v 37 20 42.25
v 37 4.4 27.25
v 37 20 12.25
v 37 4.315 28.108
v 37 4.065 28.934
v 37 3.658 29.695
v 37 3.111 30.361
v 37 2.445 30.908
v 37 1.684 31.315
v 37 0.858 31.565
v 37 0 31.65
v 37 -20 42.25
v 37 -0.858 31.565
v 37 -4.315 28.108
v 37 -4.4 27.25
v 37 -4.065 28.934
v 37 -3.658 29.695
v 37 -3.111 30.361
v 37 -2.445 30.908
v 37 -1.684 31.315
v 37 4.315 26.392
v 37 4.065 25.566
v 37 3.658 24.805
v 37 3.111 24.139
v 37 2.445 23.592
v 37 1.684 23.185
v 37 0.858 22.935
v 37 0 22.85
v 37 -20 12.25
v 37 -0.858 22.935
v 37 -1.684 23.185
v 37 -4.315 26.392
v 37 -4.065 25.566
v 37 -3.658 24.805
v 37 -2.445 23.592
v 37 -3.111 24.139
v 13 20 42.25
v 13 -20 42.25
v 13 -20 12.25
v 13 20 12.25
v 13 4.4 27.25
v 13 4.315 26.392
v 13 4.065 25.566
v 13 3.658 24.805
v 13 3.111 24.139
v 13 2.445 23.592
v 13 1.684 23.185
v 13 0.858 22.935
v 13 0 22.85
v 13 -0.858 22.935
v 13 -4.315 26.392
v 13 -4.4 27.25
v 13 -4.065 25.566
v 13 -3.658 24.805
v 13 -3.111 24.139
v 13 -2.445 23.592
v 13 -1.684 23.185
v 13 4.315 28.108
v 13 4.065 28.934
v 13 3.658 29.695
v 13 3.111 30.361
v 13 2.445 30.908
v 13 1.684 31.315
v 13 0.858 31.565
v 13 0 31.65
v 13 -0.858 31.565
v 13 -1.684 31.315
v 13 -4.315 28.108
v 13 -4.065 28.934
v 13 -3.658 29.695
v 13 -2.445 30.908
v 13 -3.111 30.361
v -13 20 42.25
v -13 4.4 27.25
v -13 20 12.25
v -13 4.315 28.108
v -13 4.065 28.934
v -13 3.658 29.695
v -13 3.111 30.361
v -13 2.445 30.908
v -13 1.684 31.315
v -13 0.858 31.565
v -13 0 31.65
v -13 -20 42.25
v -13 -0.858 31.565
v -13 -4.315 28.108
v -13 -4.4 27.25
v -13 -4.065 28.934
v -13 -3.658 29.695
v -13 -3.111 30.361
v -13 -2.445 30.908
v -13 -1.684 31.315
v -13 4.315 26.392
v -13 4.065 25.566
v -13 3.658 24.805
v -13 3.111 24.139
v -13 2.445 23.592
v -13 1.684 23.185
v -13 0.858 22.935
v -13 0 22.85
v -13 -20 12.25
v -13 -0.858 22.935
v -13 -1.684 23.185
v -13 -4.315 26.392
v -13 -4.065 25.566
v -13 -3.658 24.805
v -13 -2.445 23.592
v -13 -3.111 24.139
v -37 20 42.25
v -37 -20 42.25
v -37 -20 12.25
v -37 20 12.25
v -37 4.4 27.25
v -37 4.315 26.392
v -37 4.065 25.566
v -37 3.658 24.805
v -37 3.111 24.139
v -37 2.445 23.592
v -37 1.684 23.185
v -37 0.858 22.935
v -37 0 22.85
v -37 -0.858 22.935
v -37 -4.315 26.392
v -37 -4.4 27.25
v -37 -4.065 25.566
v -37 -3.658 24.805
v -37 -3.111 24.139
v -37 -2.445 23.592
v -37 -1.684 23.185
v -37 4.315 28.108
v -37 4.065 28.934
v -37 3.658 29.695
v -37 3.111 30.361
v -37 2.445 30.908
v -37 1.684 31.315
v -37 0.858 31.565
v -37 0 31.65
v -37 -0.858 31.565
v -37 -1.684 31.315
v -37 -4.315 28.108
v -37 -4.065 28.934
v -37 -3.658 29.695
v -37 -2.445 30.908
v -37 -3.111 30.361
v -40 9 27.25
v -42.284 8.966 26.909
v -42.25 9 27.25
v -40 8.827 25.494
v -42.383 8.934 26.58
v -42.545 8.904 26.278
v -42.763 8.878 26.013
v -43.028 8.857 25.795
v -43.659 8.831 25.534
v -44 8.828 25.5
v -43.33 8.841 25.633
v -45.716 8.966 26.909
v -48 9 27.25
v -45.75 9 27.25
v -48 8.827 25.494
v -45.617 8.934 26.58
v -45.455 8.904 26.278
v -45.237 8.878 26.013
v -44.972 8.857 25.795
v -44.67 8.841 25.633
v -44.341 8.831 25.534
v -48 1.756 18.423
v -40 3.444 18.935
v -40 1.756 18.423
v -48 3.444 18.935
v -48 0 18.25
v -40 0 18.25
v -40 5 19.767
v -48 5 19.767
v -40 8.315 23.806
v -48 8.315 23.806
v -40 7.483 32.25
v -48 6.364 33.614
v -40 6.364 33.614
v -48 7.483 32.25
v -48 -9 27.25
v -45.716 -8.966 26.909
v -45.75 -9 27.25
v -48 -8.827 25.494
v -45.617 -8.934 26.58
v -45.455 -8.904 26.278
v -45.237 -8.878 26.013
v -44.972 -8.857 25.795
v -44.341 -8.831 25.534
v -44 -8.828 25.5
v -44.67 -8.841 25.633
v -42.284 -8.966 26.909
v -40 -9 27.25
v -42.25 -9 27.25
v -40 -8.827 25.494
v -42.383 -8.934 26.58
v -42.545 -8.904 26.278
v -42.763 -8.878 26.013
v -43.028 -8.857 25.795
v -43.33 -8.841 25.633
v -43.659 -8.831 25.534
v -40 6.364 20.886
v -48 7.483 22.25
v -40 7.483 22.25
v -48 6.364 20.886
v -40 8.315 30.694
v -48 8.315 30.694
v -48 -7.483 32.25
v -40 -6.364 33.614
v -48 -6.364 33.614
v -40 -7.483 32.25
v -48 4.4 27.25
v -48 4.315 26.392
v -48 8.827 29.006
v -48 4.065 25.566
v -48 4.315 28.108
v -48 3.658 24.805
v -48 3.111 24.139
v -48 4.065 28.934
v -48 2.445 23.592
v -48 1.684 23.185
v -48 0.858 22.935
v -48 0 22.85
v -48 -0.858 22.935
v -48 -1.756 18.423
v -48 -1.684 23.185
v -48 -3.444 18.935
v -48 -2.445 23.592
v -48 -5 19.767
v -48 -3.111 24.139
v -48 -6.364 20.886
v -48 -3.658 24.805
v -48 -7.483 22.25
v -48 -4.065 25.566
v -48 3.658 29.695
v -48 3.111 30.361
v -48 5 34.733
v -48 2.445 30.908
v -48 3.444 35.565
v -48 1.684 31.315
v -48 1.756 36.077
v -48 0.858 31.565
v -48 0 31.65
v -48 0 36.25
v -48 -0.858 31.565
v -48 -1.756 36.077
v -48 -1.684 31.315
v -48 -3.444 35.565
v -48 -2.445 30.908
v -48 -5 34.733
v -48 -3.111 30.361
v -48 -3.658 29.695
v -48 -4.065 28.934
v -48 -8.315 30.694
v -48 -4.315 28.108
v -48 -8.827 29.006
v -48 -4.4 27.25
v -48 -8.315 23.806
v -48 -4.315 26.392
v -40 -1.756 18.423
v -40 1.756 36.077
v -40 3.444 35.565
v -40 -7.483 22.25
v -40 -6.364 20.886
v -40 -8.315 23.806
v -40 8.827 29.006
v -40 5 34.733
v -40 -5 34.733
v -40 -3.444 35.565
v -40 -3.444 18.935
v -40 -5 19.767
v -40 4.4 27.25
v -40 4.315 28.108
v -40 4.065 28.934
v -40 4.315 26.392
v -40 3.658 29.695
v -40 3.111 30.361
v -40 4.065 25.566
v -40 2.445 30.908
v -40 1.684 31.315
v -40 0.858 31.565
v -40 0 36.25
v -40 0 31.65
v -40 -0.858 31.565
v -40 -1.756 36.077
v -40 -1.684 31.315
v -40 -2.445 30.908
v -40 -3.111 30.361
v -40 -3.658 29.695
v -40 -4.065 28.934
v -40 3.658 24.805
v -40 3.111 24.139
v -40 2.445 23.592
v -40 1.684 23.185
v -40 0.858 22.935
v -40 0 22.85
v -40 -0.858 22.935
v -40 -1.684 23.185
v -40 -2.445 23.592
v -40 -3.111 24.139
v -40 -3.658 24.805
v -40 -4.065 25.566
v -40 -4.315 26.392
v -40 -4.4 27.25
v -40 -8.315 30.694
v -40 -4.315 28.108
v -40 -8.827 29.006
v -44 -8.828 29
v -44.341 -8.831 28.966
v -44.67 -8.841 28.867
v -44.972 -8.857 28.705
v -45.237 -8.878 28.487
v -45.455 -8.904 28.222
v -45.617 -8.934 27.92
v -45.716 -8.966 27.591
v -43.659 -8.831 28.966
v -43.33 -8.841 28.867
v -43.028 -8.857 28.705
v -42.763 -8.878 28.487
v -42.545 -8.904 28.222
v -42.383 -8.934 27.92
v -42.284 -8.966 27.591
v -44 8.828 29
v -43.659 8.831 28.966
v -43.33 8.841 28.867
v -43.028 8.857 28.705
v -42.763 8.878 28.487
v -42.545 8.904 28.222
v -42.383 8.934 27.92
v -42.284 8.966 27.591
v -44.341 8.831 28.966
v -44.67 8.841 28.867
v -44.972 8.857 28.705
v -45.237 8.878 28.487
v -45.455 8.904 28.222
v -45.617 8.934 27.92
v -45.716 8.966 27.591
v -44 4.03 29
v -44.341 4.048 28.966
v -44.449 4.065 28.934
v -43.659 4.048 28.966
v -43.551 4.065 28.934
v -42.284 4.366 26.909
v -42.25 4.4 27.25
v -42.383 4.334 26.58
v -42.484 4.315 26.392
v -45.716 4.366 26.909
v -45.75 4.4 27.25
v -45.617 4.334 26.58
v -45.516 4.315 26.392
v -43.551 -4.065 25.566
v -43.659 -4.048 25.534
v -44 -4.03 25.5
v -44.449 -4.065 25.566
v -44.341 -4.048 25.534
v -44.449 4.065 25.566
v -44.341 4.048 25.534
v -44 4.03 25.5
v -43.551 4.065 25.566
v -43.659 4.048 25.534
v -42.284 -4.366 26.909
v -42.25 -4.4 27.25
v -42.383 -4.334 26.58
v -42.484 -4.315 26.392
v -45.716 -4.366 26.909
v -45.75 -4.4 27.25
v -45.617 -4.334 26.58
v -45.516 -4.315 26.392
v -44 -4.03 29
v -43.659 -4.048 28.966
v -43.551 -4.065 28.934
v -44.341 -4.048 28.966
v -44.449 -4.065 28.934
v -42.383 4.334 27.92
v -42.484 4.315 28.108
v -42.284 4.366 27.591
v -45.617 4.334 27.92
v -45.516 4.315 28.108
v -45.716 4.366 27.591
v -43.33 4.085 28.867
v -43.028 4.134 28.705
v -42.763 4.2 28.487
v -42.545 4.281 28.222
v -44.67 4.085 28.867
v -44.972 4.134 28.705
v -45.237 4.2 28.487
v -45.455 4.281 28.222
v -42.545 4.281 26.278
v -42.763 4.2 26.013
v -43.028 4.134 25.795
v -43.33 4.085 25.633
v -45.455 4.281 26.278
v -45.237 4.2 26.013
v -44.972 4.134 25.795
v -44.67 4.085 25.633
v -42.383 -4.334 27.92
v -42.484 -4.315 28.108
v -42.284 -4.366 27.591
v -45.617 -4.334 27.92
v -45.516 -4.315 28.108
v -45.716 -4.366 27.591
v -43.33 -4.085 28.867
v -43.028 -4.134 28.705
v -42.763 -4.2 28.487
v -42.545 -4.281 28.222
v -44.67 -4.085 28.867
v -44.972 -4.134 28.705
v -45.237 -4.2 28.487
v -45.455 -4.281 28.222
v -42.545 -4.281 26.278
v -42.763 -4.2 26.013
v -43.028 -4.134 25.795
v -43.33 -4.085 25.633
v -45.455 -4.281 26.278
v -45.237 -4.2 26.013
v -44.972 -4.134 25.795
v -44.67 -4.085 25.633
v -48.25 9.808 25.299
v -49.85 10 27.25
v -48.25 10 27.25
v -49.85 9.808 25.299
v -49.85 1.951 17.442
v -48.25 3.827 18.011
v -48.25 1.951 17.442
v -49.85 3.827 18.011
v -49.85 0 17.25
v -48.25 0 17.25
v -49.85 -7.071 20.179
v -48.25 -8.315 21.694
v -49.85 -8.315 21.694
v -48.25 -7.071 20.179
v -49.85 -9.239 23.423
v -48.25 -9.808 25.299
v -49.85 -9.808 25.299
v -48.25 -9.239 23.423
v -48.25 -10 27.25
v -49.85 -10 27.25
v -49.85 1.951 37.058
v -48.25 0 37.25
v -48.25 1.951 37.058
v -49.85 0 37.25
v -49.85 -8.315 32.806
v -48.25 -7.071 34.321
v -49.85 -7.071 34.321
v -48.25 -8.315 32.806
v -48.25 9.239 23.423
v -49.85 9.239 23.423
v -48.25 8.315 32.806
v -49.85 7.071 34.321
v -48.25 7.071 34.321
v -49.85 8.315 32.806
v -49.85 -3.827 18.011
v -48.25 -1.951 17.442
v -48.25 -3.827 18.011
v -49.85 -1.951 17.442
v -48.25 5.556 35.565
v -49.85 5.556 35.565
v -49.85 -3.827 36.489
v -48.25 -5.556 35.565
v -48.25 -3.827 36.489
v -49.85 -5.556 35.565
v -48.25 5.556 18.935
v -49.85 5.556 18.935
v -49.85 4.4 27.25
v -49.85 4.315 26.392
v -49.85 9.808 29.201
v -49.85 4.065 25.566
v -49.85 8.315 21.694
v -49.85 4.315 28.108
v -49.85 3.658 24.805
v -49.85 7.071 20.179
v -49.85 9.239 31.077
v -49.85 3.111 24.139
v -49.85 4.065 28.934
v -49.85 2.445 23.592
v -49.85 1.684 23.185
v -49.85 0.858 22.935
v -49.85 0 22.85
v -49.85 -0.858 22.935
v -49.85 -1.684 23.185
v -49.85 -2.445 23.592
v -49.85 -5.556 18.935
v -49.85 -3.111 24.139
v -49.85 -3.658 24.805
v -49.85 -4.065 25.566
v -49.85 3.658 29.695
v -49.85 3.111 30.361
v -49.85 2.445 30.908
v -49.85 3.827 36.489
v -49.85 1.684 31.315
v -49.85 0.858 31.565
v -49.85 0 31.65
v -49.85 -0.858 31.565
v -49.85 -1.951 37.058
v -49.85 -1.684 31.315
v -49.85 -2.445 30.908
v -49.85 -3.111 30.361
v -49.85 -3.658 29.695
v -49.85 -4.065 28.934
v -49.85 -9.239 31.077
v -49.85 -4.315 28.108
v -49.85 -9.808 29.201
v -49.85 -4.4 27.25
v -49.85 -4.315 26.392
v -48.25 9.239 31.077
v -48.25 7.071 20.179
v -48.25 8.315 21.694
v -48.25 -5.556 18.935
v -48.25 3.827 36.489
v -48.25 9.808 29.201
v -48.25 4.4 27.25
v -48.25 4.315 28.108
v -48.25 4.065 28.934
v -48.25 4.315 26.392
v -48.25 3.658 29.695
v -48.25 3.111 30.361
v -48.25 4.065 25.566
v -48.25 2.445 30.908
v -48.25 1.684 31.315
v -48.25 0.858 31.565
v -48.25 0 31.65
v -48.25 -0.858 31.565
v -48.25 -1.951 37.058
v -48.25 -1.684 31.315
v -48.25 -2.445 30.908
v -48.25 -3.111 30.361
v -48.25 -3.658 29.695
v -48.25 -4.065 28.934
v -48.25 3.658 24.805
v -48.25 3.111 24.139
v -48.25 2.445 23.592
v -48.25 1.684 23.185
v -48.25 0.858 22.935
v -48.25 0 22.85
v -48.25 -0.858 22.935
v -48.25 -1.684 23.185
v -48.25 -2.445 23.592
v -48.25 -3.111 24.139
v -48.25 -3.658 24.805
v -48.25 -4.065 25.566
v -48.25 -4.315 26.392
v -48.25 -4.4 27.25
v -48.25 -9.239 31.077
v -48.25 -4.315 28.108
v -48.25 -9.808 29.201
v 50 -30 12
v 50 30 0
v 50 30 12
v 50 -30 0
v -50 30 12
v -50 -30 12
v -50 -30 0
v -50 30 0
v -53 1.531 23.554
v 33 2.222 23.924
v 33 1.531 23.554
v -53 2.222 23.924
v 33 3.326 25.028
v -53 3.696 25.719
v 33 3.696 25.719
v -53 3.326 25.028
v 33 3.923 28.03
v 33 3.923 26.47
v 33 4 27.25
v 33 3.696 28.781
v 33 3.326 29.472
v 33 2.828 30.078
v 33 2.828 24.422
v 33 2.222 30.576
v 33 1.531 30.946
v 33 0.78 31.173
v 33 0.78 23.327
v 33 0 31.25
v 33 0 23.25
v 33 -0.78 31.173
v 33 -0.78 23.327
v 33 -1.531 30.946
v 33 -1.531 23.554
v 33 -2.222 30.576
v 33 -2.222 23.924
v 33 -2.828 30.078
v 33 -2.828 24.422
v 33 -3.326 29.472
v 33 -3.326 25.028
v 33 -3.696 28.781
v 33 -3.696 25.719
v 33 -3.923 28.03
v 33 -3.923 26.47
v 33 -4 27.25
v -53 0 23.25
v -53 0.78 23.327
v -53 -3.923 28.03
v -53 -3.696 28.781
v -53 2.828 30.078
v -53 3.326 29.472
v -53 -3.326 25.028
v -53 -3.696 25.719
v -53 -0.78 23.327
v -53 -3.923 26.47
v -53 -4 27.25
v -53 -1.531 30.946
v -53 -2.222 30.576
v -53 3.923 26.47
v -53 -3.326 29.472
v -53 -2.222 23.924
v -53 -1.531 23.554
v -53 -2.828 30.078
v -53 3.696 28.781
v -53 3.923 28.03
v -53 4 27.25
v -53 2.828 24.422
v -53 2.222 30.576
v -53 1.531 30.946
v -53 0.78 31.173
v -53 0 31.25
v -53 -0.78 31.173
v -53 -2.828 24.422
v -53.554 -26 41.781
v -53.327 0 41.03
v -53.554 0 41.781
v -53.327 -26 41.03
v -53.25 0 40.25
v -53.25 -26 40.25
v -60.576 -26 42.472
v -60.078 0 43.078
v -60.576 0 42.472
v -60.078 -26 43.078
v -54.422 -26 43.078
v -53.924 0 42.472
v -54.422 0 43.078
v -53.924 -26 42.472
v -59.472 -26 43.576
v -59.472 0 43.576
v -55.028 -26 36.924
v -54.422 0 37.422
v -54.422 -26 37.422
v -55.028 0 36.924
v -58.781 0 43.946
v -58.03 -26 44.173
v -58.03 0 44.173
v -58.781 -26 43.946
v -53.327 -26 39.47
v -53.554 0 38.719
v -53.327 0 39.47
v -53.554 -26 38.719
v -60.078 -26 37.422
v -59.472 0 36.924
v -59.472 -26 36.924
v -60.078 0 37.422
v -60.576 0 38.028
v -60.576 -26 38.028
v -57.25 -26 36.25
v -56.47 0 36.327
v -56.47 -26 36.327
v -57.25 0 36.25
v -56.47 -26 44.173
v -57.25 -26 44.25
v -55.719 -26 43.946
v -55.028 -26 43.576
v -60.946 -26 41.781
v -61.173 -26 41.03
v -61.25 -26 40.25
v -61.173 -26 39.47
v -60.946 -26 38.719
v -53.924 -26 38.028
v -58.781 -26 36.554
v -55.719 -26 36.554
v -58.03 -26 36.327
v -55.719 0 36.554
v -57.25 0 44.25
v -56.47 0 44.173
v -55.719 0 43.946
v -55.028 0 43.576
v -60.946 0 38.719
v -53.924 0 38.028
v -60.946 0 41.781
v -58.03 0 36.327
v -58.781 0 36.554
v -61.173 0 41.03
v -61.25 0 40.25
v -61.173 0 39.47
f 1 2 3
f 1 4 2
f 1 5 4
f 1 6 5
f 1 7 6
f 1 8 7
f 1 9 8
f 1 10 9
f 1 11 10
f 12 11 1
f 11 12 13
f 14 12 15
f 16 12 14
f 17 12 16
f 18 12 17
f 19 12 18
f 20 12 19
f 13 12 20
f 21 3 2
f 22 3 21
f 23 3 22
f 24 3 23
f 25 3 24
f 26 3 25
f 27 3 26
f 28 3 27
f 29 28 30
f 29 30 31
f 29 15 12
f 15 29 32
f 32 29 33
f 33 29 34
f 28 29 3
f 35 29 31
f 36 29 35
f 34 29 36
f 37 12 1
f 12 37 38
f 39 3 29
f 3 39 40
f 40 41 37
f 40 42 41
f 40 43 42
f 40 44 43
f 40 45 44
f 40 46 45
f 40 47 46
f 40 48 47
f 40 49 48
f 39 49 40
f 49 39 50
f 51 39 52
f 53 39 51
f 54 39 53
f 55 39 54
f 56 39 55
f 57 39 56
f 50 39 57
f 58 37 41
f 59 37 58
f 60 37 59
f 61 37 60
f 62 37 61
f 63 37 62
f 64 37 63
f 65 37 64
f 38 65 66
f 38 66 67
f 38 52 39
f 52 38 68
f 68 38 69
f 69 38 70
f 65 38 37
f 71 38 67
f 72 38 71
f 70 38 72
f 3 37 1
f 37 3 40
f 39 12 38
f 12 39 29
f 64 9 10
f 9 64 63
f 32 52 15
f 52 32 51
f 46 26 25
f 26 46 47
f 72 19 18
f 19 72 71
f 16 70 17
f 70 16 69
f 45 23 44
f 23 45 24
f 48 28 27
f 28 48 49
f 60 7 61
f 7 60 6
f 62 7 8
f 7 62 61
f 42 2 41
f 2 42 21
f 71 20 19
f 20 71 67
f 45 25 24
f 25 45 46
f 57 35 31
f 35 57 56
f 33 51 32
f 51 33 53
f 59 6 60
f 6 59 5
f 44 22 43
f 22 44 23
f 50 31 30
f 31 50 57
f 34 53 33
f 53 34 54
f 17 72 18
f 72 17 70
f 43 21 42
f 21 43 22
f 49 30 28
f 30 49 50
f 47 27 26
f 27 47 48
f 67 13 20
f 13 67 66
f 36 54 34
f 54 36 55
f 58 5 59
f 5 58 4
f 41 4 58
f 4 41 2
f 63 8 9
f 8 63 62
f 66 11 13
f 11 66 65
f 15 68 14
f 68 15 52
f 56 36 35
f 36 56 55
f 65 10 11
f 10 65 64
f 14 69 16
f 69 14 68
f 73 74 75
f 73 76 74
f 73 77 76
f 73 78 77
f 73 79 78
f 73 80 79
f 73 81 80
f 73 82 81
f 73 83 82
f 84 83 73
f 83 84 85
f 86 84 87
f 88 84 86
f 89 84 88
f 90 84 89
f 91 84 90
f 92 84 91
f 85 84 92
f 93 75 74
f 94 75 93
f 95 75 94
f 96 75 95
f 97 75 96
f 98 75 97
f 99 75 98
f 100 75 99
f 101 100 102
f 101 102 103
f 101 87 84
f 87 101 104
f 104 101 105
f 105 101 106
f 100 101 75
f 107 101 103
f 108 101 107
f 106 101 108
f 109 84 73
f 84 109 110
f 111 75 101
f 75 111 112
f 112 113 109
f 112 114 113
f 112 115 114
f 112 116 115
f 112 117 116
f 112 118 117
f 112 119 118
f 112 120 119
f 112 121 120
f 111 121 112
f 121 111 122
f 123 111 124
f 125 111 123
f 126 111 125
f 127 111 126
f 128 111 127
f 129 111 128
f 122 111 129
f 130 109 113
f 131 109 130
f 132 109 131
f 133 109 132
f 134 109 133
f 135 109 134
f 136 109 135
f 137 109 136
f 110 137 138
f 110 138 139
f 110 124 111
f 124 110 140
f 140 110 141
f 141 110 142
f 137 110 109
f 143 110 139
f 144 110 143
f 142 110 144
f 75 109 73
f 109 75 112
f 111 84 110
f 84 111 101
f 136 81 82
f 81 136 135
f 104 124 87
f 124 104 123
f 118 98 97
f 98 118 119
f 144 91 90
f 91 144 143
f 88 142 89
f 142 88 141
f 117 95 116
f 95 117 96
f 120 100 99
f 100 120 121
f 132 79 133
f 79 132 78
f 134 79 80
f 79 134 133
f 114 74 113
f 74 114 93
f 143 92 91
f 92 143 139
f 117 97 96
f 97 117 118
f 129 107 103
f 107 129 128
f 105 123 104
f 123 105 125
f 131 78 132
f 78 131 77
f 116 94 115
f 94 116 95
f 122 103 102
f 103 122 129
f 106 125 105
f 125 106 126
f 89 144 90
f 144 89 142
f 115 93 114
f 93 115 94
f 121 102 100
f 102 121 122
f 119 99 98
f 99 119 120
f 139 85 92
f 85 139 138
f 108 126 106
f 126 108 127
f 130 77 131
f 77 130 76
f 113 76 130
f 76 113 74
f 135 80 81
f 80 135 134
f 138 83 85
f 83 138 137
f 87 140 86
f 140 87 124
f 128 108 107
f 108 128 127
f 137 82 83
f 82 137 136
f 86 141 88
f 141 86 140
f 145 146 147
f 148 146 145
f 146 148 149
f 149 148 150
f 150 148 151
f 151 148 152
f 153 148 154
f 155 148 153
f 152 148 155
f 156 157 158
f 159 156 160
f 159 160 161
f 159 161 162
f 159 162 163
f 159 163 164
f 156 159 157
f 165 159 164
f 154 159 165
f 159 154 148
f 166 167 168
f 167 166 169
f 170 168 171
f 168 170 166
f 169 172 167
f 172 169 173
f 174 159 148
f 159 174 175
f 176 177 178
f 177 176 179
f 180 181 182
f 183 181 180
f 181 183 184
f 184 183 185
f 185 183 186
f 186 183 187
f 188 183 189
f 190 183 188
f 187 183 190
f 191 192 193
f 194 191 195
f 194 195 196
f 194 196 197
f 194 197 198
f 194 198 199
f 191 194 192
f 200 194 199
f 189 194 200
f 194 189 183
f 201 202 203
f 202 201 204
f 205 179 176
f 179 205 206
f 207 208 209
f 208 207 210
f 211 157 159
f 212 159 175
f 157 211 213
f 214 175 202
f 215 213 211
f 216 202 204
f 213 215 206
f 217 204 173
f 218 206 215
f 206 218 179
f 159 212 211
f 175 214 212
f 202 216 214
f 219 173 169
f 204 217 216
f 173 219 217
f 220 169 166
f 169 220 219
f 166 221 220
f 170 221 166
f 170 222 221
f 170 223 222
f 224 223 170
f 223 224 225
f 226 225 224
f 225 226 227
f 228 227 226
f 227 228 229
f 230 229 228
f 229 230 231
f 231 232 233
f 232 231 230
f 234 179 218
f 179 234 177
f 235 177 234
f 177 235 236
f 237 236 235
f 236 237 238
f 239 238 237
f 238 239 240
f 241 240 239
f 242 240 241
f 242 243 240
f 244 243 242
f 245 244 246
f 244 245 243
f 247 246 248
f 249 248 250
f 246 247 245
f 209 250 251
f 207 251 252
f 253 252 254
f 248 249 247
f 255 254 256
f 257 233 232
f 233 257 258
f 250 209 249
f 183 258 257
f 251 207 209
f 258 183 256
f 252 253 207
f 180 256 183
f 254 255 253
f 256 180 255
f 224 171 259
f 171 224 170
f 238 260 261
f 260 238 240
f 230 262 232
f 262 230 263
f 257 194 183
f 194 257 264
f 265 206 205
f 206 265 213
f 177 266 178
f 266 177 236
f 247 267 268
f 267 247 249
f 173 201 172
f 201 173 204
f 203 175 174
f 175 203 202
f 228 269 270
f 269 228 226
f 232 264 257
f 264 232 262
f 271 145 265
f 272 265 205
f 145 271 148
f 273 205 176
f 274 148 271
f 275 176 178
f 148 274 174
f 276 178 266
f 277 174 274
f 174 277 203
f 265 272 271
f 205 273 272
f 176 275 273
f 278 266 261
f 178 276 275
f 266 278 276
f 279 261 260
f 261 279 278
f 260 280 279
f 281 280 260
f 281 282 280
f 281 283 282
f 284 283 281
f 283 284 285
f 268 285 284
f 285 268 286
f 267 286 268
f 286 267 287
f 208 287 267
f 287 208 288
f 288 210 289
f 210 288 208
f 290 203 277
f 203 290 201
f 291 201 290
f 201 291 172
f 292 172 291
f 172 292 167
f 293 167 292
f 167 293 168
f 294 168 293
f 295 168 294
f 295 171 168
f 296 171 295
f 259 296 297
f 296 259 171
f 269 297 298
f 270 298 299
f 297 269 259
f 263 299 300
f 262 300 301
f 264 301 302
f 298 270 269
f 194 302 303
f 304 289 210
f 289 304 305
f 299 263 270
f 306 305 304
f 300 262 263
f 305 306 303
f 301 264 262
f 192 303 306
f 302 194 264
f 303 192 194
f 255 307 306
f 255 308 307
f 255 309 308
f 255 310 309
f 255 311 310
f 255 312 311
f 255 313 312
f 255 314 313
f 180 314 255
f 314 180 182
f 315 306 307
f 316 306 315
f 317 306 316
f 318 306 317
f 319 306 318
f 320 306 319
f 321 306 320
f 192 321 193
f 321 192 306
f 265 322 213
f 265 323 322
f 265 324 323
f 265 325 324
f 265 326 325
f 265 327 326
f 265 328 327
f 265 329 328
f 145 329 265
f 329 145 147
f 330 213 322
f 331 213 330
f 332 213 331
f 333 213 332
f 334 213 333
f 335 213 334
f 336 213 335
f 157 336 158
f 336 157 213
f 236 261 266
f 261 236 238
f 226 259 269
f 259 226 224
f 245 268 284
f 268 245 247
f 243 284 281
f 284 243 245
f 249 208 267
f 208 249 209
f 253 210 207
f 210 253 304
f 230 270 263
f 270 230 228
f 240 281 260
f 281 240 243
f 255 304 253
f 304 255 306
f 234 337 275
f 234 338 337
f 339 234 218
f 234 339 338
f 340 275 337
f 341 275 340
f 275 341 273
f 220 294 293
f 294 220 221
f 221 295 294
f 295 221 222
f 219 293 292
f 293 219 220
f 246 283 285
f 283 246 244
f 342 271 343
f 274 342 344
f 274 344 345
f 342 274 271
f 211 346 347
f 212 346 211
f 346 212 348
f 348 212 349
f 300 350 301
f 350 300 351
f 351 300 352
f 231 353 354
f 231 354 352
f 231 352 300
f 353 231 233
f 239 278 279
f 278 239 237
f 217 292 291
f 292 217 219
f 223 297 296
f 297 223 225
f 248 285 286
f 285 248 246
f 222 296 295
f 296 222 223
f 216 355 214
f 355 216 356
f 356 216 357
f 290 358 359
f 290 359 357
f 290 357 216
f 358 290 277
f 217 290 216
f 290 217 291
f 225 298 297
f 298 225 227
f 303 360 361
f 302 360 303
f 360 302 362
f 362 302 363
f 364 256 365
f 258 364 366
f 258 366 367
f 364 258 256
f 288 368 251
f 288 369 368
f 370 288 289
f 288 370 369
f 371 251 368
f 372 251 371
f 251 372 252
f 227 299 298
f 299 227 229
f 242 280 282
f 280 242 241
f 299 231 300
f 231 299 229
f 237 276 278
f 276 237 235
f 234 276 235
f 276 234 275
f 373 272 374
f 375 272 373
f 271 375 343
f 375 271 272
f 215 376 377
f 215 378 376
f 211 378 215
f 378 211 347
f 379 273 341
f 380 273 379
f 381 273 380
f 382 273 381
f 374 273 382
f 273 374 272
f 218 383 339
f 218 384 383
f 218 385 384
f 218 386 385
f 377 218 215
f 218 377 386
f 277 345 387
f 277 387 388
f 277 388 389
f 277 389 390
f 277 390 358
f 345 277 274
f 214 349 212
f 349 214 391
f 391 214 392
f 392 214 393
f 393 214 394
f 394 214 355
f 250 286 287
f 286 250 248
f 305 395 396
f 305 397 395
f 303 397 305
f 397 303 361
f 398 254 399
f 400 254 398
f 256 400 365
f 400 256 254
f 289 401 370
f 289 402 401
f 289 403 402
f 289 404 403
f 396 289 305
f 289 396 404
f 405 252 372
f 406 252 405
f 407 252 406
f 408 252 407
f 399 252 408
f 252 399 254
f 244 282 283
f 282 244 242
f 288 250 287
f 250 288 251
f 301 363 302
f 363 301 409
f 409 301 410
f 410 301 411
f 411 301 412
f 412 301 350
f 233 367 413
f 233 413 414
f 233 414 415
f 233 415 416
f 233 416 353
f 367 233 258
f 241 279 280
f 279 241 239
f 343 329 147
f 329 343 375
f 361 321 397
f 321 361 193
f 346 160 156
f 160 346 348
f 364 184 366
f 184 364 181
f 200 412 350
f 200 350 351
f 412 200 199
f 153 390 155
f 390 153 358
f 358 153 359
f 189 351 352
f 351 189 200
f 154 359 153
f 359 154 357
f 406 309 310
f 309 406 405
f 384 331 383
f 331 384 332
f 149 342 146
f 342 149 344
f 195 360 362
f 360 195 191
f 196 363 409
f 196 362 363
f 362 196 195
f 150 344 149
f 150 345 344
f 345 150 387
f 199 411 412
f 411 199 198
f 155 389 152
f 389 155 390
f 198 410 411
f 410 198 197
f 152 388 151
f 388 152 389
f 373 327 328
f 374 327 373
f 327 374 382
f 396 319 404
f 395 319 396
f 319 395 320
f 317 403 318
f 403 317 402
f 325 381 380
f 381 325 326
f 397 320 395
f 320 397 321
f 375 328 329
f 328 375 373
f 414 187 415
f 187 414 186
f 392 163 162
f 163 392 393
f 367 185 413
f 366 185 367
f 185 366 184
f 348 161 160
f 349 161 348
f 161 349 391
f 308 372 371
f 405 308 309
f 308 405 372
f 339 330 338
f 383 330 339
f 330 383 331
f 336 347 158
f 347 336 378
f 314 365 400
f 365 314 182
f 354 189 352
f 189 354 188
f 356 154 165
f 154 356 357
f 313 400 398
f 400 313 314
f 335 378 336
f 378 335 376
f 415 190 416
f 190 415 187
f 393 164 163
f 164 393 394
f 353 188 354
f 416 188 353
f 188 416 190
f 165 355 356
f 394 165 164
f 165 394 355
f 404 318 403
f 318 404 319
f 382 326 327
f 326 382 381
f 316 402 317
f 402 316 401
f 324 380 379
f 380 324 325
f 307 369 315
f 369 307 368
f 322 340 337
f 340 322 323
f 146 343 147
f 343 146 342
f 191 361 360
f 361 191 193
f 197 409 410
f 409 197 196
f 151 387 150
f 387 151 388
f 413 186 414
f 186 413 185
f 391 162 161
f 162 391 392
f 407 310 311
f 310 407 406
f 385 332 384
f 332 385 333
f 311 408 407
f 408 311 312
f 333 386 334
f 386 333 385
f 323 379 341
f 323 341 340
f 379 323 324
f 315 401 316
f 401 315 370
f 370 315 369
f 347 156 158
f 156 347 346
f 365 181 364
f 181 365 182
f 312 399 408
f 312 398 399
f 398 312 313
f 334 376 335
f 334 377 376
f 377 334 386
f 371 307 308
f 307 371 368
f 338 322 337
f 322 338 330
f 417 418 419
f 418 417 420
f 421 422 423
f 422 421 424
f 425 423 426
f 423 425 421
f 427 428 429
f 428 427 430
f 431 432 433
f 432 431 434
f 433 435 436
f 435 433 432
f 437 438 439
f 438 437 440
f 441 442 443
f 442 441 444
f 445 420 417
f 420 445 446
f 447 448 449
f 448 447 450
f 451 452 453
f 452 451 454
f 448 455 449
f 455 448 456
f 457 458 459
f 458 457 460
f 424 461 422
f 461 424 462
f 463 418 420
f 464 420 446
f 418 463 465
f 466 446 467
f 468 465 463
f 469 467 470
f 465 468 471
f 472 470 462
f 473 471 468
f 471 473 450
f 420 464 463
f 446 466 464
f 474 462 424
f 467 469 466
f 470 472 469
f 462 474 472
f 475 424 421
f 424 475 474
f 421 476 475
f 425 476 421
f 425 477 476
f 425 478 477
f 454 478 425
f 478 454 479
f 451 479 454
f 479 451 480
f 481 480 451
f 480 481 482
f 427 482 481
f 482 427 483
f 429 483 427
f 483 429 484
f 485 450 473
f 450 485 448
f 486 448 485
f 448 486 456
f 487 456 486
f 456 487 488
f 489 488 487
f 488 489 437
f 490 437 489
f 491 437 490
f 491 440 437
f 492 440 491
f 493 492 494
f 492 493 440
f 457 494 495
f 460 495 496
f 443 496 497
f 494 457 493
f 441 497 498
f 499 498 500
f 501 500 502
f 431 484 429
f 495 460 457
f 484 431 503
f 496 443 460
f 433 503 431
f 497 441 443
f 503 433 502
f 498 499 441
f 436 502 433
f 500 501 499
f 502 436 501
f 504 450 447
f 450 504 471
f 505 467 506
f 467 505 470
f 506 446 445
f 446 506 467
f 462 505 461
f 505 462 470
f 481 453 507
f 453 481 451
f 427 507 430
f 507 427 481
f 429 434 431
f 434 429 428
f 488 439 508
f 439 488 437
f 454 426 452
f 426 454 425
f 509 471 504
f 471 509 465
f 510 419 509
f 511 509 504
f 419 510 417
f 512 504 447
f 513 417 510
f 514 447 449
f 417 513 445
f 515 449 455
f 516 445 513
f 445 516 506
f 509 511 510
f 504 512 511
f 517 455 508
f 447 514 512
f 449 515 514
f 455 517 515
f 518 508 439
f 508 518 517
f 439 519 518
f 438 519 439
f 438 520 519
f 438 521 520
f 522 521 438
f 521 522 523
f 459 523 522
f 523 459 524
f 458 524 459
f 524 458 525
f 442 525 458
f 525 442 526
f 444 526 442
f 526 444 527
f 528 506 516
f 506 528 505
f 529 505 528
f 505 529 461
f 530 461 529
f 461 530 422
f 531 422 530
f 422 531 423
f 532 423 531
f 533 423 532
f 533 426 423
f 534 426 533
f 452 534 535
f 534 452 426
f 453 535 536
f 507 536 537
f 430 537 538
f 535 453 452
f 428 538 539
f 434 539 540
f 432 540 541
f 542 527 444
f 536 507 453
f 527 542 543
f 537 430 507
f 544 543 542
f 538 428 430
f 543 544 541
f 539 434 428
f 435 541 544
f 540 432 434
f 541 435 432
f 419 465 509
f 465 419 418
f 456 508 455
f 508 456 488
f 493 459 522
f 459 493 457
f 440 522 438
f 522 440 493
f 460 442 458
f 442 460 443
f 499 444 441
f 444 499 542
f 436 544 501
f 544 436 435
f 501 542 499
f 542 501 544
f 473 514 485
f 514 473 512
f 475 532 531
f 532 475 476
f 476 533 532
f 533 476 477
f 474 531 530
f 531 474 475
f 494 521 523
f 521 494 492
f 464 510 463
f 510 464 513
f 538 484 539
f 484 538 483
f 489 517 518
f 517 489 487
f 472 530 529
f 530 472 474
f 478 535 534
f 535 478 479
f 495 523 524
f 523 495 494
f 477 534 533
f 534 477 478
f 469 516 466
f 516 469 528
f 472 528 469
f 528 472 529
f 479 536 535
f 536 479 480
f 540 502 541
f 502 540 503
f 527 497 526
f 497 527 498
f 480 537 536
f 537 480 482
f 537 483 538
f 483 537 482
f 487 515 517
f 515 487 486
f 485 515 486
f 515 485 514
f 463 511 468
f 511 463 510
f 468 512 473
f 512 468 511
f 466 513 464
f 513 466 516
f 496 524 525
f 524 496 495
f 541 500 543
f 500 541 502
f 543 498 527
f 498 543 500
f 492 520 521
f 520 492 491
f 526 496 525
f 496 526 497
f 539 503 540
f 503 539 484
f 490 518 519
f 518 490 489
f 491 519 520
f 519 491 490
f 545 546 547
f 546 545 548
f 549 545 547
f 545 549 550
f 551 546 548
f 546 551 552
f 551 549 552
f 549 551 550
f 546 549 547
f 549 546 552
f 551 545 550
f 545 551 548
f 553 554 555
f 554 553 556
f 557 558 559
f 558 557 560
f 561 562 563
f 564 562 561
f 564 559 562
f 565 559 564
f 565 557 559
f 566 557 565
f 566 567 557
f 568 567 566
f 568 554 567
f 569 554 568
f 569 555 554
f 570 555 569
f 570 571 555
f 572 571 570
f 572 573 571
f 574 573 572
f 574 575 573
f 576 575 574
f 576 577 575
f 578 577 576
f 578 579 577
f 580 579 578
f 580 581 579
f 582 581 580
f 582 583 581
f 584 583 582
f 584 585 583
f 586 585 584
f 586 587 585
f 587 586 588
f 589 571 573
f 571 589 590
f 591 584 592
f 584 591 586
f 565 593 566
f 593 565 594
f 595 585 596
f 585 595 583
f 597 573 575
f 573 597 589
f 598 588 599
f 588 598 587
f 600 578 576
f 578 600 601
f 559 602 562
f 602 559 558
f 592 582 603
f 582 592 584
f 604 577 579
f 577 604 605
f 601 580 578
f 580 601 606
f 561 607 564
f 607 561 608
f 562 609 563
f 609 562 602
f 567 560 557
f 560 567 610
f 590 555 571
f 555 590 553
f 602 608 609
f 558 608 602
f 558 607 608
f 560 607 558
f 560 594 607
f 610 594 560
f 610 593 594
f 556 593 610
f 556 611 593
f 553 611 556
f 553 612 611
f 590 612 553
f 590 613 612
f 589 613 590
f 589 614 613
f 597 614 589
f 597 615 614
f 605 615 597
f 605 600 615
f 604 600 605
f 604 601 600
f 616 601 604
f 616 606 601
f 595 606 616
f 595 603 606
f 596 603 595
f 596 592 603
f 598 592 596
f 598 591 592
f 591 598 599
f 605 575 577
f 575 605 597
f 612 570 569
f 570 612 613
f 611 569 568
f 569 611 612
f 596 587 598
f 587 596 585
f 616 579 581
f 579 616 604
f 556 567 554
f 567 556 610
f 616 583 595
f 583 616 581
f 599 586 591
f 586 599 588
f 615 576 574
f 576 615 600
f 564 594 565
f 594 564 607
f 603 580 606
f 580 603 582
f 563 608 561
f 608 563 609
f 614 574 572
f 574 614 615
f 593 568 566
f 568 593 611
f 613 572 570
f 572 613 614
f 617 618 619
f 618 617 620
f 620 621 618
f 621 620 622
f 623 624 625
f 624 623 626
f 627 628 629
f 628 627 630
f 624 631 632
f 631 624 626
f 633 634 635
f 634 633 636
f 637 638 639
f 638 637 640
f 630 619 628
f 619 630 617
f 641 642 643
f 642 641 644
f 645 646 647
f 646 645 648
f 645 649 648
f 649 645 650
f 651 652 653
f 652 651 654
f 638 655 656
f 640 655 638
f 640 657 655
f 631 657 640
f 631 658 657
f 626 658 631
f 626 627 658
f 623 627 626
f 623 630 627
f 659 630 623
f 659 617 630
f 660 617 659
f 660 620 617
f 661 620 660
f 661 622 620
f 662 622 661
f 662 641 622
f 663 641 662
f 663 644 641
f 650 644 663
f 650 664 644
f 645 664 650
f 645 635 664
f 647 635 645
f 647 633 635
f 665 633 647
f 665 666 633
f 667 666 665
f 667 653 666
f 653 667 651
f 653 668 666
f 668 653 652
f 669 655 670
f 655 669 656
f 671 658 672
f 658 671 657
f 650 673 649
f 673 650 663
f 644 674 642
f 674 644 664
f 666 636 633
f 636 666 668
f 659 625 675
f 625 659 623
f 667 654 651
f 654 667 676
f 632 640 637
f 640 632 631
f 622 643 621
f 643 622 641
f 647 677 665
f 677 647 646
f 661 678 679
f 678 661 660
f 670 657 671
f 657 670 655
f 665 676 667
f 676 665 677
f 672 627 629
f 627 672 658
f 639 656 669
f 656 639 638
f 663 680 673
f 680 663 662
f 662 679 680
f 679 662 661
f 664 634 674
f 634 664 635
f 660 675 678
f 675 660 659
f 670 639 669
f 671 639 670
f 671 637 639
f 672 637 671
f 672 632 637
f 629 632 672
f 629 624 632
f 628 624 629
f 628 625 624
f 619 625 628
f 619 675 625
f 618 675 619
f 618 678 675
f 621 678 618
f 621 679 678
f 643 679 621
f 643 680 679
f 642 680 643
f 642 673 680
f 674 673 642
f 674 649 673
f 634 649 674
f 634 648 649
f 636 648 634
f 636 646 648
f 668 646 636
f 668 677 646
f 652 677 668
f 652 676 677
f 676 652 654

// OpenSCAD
$fn = 32;

// ------------------------------------------------------------------------
// Machine vise: screw d8, jaws 24 x 30 mm
// Every part is its own module, assembly() places every instance.
// ------------------------------------------------------------------------

// --- part 1 ---
module vise_bed() {
  difference() {
    translate([-50, -30, 0]) cube([100, 60, 12]);
  }
}

// --- part 2 ---
module vise_jaw() {
  difference() {
    translate([-12, -20, 0]) cube([24, 40, 30]);
    translate([0, 0, 15]) rotate([0, 90, 0]) cylinder(h = 26, d = 8.8, center = true);
  }
}

// --- part 3 ---
module vise_screw() {
  translate([0, 0, -43]) cylinder(h = 86, d = 8);
}

// --- part 4 ---
module screw_collar() {
  difference() {
    cylinder(h = 8, d = 18);
    translate([0, 0, -1]) cylinder(h = 10, d = 8.8);
    translate([0, 0, 4]) rotate([90, 0, 0]) cylinder(h = 20, d = 3.5, center = true);
  }
}

// --- part 5 ---
module screw_washer() {
  difference() {
      translate([0, 0, 0]) cylinder(h = 1.6, d = 20);
      translate([0, 0, -1]) cylinder(h = 3.6, d = 8.8);
    }
}

// --- part 6 ---
module vise_handle() {
  cylinder(h = 26, d = 8);
}

// --- assembly ---
module assembly() {
  color([0.80, 0.24, 0.20]) translate([0, 0, 0]) rotate([0, 0, 0]) vise_bed();
  color([0.20, 0.45, 0.75]) translate([25, 0, 12.25]) rotate([0, 0, 0]) vise_jaw();
  color([0.25, 0.62, 0.32]) translate([-25, 0, 12.25]) rotate([0, 0, 0]) vise_jaw();
  color([0.92, 0.70, 0.18]) translate([-10, 0, 27.25]) rotate([0, 90, 0]) vise_screw();
  color([0.58, 0.35, 0.70]) translate([-48, 0, 27.25]) rotate([0, 90, 0]) screw_collar();
  color([0.16, 0.66, 0.66]) translate([-49.85, 0, 27.25]) rotate([0, 90, 0]) screw_washer();
  color([0.85, 0.48, 0.18]) translate([-57.25, 0, 40.25]) rotate([90, 0, 0]) vise_handle();
}

assembly();
